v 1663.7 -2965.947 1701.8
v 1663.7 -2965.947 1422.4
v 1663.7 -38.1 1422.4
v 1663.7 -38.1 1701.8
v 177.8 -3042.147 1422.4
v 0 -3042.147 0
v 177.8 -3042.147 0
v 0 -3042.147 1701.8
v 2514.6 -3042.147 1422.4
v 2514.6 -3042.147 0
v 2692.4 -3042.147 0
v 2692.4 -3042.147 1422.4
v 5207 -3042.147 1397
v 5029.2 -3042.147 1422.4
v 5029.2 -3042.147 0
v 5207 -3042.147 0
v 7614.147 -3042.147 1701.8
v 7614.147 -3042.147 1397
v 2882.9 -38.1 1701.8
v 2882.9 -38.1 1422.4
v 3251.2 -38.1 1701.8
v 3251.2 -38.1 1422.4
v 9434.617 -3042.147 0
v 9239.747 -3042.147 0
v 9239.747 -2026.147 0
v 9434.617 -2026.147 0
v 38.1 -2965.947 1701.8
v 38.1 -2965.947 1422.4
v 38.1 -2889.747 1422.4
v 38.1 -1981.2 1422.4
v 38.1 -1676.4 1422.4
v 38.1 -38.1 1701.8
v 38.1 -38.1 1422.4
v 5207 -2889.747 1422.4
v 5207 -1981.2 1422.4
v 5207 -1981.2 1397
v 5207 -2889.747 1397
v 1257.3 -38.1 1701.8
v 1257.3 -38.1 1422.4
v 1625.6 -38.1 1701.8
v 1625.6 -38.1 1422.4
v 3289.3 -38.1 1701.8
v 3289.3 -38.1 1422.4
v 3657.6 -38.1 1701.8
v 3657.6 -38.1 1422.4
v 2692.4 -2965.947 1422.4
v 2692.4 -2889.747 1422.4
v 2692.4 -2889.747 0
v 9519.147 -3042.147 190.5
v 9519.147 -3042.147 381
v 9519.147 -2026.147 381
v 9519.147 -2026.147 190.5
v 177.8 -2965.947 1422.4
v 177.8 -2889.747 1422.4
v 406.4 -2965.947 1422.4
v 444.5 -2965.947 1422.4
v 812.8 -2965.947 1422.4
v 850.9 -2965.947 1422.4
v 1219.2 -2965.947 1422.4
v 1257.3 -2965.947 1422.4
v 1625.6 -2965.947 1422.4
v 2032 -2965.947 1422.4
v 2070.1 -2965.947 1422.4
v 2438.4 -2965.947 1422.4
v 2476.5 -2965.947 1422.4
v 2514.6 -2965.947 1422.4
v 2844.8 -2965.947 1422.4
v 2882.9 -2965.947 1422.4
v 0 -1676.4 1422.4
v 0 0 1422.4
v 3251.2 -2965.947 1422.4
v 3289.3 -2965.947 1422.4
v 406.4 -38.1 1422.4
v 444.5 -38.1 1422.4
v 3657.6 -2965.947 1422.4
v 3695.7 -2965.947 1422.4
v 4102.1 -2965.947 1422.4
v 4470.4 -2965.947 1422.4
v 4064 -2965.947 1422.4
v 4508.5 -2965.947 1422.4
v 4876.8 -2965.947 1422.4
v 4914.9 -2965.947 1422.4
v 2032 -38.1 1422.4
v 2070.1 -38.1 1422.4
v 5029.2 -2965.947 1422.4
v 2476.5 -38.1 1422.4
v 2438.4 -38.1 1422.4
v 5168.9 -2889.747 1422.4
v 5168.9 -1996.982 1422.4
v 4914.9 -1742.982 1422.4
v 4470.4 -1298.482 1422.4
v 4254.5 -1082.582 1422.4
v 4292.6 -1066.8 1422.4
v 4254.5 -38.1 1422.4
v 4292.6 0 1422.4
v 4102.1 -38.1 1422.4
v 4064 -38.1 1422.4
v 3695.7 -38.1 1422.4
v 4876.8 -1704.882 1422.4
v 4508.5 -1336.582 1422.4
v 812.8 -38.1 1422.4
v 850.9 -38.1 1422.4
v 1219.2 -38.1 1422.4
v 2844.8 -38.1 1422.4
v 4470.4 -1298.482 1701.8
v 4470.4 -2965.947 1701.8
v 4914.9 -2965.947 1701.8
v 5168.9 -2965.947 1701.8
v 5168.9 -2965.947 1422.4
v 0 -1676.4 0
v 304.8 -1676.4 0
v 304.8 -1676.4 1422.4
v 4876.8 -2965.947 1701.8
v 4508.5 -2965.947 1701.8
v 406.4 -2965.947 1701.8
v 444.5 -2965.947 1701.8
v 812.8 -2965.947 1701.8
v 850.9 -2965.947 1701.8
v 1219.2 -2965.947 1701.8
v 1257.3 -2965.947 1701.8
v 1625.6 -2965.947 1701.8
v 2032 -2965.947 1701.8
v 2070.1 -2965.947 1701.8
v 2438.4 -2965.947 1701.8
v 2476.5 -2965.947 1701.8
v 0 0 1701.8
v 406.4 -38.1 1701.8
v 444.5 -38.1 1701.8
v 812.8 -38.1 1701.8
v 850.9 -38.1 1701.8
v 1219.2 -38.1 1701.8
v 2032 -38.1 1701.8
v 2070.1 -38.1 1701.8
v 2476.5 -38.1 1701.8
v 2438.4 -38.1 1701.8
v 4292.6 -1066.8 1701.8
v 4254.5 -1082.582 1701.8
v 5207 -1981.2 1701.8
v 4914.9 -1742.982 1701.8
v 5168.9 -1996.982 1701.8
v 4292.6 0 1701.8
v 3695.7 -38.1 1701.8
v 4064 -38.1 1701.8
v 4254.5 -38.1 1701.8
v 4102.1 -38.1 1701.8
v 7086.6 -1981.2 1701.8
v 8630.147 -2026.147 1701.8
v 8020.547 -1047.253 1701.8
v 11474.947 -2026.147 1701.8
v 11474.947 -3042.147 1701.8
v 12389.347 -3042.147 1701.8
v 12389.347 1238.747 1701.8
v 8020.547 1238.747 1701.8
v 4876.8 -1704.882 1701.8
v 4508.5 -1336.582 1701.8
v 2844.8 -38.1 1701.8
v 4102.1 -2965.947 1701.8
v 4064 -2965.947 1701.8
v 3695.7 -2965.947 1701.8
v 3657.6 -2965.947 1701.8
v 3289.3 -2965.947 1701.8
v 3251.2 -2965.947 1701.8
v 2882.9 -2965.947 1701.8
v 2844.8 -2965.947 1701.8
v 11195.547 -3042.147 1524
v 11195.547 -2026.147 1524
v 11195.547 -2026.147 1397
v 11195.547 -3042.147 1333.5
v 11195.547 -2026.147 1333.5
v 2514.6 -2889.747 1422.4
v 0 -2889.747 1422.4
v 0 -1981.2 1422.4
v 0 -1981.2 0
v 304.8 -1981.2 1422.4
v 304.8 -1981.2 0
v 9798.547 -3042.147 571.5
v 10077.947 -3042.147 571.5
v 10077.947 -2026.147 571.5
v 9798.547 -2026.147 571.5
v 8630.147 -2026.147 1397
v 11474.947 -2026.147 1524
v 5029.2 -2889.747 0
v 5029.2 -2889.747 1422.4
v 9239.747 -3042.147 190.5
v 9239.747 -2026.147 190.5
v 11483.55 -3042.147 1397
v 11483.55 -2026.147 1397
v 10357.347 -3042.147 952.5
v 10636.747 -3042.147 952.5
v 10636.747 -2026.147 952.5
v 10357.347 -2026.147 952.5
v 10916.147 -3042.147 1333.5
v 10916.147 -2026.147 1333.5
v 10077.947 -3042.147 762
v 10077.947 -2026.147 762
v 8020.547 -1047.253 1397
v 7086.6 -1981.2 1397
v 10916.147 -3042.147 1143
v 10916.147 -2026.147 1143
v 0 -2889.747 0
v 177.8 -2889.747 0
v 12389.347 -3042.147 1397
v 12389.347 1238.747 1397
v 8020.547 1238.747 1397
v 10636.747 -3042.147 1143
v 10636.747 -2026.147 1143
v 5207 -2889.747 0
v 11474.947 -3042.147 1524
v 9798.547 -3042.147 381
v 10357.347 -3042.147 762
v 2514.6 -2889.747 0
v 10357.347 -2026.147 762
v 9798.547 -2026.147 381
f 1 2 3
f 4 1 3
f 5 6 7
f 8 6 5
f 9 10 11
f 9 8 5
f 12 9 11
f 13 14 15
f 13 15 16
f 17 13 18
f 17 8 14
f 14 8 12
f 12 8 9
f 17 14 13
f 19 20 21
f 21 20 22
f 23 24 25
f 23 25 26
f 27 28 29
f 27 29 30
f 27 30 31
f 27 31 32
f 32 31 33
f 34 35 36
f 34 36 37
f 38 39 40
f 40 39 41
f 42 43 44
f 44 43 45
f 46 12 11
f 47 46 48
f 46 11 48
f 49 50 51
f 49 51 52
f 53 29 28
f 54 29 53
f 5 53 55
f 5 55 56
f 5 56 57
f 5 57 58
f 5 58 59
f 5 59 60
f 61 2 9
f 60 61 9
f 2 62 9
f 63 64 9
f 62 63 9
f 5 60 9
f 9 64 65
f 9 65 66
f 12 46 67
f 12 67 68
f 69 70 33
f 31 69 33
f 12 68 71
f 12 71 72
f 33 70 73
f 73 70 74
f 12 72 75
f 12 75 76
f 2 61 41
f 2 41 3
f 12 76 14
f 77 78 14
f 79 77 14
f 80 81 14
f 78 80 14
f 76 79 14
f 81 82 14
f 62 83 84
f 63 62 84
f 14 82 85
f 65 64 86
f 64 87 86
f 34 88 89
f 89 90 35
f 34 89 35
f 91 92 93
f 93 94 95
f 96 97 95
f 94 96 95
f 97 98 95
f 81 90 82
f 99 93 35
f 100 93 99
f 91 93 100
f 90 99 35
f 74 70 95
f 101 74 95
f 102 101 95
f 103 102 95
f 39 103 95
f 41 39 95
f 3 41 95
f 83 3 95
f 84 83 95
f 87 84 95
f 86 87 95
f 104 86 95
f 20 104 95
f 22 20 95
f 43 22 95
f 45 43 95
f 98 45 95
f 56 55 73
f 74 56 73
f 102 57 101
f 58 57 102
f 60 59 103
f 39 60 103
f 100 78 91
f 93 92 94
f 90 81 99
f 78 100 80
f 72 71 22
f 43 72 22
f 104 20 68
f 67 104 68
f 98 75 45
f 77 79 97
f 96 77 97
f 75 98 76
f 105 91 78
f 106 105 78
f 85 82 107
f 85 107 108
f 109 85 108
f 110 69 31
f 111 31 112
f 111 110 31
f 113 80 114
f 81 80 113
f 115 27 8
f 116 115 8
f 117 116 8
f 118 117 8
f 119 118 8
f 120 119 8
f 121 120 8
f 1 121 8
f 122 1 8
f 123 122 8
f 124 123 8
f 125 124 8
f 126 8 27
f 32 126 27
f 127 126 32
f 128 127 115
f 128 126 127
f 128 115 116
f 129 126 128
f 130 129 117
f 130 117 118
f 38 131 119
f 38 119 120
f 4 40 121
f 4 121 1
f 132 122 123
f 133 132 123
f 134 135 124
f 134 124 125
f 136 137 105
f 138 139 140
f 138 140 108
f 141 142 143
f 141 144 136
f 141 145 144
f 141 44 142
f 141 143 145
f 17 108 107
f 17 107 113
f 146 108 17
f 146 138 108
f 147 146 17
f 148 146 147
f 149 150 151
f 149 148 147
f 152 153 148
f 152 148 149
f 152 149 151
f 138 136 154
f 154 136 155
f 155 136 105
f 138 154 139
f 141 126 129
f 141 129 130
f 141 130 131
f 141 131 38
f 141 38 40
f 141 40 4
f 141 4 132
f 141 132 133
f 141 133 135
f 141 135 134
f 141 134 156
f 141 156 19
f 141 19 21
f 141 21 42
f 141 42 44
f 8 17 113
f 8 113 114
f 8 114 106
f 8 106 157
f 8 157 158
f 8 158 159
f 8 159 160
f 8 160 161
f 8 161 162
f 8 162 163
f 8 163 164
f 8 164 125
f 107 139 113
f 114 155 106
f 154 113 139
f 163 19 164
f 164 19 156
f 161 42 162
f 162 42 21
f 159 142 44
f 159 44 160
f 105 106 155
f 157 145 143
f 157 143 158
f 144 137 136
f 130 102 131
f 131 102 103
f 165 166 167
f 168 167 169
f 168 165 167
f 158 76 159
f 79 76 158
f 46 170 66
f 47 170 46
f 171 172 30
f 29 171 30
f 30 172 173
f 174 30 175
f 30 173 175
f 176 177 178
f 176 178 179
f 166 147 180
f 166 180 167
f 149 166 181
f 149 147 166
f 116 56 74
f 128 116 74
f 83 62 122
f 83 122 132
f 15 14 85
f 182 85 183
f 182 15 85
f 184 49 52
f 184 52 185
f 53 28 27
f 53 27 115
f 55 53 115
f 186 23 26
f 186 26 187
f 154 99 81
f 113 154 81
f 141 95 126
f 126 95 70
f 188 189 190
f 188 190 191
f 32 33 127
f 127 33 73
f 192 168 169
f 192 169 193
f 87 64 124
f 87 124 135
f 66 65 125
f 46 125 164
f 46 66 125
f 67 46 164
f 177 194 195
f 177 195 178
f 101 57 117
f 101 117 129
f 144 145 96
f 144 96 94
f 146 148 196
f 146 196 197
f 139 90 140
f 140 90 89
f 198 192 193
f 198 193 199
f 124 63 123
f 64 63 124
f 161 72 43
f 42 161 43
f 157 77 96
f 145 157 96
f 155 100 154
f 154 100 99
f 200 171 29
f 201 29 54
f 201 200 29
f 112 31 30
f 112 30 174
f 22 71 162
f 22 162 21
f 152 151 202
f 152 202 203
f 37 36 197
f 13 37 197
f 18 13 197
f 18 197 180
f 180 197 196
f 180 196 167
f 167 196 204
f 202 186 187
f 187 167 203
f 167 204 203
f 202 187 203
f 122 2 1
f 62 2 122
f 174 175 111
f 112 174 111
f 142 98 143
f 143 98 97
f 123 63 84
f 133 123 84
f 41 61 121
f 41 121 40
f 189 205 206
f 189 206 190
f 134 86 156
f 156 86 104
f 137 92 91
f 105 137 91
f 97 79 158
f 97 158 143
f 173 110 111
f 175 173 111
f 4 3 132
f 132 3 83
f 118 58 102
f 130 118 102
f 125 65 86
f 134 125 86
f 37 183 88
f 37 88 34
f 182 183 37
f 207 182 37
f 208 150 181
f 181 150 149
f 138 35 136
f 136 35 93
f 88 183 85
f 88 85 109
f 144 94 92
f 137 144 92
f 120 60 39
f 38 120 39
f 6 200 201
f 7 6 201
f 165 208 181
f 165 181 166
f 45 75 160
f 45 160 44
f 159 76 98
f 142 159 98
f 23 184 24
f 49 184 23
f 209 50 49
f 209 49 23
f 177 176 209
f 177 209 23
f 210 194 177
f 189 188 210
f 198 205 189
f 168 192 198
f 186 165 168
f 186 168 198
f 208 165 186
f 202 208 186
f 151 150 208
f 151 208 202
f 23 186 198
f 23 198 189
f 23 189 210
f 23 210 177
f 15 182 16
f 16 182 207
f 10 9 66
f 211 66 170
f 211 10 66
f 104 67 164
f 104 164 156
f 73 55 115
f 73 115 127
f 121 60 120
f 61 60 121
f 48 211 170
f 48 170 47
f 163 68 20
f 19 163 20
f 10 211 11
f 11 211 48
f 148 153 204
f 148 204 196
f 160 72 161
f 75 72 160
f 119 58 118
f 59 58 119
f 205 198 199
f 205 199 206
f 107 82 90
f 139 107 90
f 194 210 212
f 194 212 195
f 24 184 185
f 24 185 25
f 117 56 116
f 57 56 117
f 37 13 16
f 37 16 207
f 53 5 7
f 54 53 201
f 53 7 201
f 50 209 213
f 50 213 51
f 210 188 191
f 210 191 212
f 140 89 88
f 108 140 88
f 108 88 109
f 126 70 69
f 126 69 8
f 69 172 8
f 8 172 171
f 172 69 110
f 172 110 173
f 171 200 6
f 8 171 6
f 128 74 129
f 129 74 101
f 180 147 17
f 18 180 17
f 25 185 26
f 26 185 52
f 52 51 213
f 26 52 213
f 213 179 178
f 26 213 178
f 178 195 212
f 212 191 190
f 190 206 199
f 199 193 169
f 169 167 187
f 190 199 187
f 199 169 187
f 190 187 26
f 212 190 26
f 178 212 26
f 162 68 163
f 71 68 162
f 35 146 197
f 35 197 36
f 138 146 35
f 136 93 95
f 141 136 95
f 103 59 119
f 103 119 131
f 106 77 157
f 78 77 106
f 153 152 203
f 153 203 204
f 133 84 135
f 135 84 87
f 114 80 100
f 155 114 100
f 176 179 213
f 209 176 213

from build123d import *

# Parameters (mm, degrees)
F0_W      = 304.8
F0_H      = 304.8
F1_DEPTH  = 1422.4
F0_W_2    = 177.8
F0_H_2    = 152.4
F3_DEPTH  = 279.4
F4_W      = 5130.8
F4_H      = 38.1
F5_DEPTH  = 279.4
F6_W      = 38.1
F6_H      = 2927.8466365912
F7_DEPTH  = 279.4
F9_DEPTH  = 304.8
F10_W     = 2235.2
F10_H     = 1016
F11_DEPTH = 1701.801
F13_DEPTH = 1016
F15_DEPTH = 304.8


with BuildPart() as f1:
    # F0 (on Top) → F1 (new body)
    with BuildSketch(Plane.XY):
        with Locations((152.4, -1828.8)):
            Rectangle(F0_W, F0_H)
    extrude(amount=F1_DEPTH)



with BuildPart() as f1b:
    # F0 (on Top) → F1, piece 2 (new body)
    with BuildSketch(Plane.XY):
        with Locations((88.9, -2965.9466365912)):
            Rectangle(F0_W_2, F0_H_2)
    extrude(amount=F1_DEPTH)


with BuildPart() as f1c:
    # F0 (on Top) → F1, piece 3 (new body)
    with BuildSketch(Plane.XY):
        with Locations((2603.5, -2965.9466365912)):
            Rectangle(F0_W_2, F0_H_2)
    extrude(amount=F1_DEPTH)


with BuildPart() as f1d:
    # F0 (on Top) → F1, piece 4 (new body)
    with BuildSketch(Plane.XY):
        with Locations((5118.1, -2965.9466365912)):
            Rectangle(F0_W_2, F0_H_2)
    extrude(amount=F1_DEPTH)


with BuildPart() as f1_1:
    add(f1.part)

    add(f1b.part)  # F3 merges F1b

    add(f1c.part)  # F3 merges F1c

    add(f1d.part)  # F3 merges F1d
    # F2 (on face) → F3 (join)
    with BuildSketch(Plane.XY.offset(1422.4)):
        Polygon((4292.6, 0), (0, 0), (0, -3042.1466365912), (5207, -3042.1466365912), (5207, -1981.2), (4292.6, -1066.8), align=None)
        Polygon((38.1, -38.1), (4254.5, -38.1), (4254.5, -1082.5815367264), (5168.9, -1996.9815367264), (5168.9, -3004.0466365912), (38.1, -3004.0466365912), align=None, mode=Mode.SUBTRACT)
    extrude(amount=F3_DEPTH)

    # F4 (on face) → F5 (join, through all)
    with BuildSketch(Plane.XY.offset(1422.4)):
        with Locations((2603.5, -2984.9966365912)):
            Rectangle(F4_W, F4_H)
    extrude(amount=F5_DEPTH)

    # F6 (on face) → F7 (join, through all)
    with BuildSketch(Plane.XY.offset(1422.4)):
        with Locations((425.45, -1502.0233182956)):
            Rectangle(F6_W, F6_H)
        with Locations((831.85, -1502.0233182956)):
            Rectangle(F6_W, F6_H)
        with Locations((1238.25, -1502.0233182956)):
            Rectangle(F6_W, F6_H)
        with Locations((1644.65, -1502.0233182956)):
            Rectangle(F6_W, F6_H)
        with Locations((2051.05, -1502.0233182956)):
            Rectangle(F6_W, F6_H)
        with Locations((2457.45, -1502.0233182956)):
            Rectangle(F6_W, F6_H)
        with Locations((2863.85, -1502.0233182956)):
            Rectangle(F6_W, F6_H)
        with Locations((3270.25, -1502.0233182956)):
            Rectangle(F6_W, F6_H)
        with Locations((3676.65, -1502.0233182956)):
            Rectangle(F6_W, F6_H)
        with Locations((4083.05, -1502.0233182956)):
            Rectangle(F6_W, F6_H)
        Polygon((4470.4, -1298.4815367264), (4470.4, -2965.9466365912), (4508.5, -2965.9466365912), (4508.5, -1336.5815367264), align=None)
        Polygon((4876.8, -1704.8815367264), (4876.8, -2965.9466365912), (4914.9, -2965.9466365912), (4914.9, -1742.9815367264), align=None)
    extrude(amount=F7_DEPTH)

    # F8 (on face) → F9 (join)
    with BuildSketch(Plane.XY.offset(1701.8)):
        Polygon((7086.6, -1981.2), (5207, -1981.2), (5207, -3042.1466365912), (12389.3466365912, -3042.1466365912), (12389.3466365912, 1238.7466365912), (8020.5466365912, 1238.7466365912), (8020.5466365912, -1047.2533634088), align=None)
    extrude(amount=-F9_DEPTH)

    # F10 (on face) → F11 (cut, through all)
    with BuildSketch(Plane.XY.offset(1701.8)):
        with Locations((10357.3466365912, -2534.1466365912)):
            Rectangle(F10_W, F10_H)
    extrude(amount=-F11_DEPTH, mode=Mode.SUBTRACT)

    # F12 (on face) → F13 (join, through all)
    with BuildSketch(Plane.XZ.offset(3042.1466365912)):
        Polygon((11474.9466365912, 1524), (11195.5466365912, 1524), (11195.5466365912, 1333.5), (10916.1466365912, 1333.5), (10916.1466365912, 1143), (10636.7466365912, 1143), (10636.7466365912, 952.5), (10357.3466365912, 952.5), (10357.3466365912, 762), (10077.9466365912, 762), (10077.9466365912, 571.5), (9798.5466365912, 571.5), (9798.5466365912, 381), (9519.1466365912, 381), (9519.1466365912, 190.5), (9239.7466365912, 190.5), (9239.7466365912, 0), (9434.6166791498, 0), (11930.5900124831, 1701.8), (11474.9466365912, 1701.8), align=None)
    extrude(amount=-F13_DEPTH)

    # F14 (on face) → F15 (cut, through all)
    with BuildSketch(Plane.XY.offset(1701.8)):
        Polygon((8630.1466365912, -3042.1466365912), (9239.7466365912, -3042.1466365912), (9239.7466365912, -2026.1466365912), (8630.1466365912, -2026.1466365912), (7614.1466365912, -3042.1466365912), align=None)
    extrude(amount=-F15_DEPTH, mode=Mode.SUBTRACT)


solid = f1_1.part
